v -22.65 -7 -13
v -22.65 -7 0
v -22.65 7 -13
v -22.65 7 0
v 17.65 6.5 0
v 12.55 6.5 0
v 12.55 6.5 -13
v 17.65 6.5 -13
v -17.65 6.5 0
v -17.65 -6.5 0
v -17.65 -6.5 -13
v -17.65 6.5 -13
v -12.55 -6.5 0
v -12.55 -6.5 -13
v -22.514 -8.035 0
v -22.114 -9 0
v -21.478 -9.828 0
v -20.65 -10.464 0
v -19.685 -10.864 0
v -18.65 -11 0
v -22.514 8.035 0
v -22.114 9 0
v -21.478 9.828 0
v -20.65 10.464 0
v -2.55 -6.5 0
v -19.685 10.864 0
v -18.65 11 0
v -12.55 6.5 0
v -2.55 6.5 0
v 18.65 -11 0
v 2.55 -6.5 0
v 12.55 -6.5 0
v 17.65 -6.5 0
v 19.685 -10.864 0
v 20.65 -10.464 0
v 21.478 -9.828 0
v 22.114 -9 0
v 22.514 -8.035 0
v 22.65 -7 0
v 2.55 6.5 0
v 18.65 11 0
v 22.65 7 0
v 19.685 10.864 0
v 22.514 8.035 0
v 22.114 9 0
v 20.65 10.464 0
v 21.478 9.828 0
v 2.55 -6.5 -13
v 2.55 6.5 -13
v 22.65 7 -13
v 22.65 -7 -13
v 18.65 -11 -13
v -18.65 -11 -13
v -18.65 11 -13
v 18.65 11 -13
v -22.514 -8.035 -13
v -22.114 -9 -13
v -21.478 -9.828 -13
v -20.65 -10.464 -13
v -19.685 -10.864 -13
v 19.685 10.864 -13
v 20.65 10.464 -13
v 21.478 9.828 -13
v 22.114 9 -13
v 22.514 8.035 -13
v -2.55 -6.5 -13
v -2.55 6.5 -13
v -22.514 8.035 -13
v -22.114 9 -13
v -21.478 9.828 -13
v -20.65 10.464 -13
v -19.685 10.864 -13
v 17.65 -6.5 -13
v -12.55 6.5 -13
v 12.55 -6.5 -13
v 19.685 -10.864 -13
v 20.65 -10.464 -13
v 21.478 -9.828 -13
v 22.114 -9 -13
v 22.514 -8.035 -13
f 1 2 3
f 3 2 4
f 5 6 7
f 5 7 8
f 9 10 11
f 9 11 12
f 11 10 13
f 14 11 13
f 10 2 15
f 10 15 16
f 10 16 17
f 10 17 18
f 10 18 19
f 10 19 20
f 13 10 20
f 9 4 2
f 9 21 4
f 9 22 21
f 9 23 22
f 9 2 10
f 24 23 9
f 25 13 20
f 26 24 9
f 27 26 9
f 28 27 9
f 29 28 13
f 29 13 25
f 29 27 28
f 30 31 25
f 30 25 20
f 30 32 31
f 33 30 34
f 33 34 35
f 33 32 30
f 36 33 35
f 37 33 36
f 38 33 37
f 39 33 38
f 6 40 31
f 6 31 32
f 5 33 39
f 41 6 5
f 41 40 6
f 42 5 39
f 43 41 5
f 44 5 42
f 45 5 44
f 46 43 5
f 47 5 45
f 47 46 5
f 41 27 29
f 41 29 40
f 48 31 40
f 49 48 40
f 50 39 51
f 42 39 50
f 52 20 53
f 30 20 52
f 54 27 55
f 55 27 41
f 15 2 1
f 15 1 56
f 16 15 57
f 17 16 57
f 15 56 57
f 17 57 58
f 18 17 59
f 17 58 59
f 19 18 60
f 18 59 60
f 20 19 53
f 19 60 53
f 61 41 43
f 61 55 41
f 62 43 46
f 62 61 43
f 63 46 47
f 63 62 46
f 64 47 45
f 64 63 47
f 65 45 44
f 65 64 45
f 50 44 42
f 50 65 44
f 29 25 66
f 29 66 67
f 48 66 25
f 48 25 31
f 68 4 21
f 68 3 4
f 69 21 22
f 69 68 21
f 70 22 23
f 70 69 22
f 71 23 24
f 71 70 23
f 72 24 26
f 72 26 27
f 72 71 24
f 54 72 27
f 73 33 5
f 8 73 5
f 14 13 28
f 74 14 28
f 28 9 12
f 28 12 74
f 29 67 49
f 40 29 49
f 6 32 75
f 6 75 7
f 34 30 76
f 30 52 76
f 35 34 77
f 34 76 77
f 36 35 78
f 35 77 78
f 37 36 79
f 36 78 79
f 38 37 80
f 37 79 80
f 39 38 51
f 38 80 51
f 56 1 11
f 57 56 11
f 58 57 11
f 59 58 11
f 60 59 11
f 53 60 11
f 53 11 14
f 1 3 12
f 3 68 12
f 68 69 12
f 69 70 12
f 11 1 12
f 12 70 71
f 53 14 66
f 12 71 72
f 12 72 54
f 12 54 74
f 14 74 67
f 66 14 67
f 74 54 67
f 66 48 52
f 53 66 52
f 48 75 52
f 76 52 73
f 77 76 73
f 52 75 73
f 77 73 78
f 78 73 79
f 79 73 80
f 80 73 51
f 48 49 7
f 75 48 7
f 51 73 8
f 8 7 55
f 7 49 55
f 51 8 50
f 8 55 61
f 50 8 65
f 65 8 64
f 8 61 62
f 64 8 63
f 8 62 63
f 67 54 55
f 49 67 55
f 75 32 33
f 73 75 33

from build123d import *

# Parameters (mm, degrees)
SKETCH_W   = 45.3
SKETCH_H   = 22
SKETCH_W_2 = 5.1
SKETCH_H_2 = 13
PAD_DEPTH  = 13
FILLET_R   = 4


with BuildPart() as part:
    # Sketch → Pad (new body)
    with BuildSketch(Plane.XY):
        Rectangle(SKETCH_W, SKETCH_H)
        Rectangle(SKETCH_W_2, SKETCH_H_2, mode=Mode.SUBTRACT)
        with Locations((-15.1, 0)):
            Rectangle(SKETCH_W_2, SKETCH_H_2, mode=Mode.SUBTRACT)
        with Locations((15.1, 0)):
            Rectangle(SKETCH_W_2, SKETCH_H_2, mode=Mode.SUBTRACT)
    extrude(amount=-PAD_DEPTH)

    # Fillet
    fillet_edges = [part.edges().sort_by_distance(p)[0] for p in [
        (-22.65, -11, -6.5),
        (22.65, -11, -6.5),
        (22.65, 11, -6.5),
        (-22.65, 11, -6.5),
    ]]
    fillet(fillet_edges, radius=FILLET_R)


solid = part.part
